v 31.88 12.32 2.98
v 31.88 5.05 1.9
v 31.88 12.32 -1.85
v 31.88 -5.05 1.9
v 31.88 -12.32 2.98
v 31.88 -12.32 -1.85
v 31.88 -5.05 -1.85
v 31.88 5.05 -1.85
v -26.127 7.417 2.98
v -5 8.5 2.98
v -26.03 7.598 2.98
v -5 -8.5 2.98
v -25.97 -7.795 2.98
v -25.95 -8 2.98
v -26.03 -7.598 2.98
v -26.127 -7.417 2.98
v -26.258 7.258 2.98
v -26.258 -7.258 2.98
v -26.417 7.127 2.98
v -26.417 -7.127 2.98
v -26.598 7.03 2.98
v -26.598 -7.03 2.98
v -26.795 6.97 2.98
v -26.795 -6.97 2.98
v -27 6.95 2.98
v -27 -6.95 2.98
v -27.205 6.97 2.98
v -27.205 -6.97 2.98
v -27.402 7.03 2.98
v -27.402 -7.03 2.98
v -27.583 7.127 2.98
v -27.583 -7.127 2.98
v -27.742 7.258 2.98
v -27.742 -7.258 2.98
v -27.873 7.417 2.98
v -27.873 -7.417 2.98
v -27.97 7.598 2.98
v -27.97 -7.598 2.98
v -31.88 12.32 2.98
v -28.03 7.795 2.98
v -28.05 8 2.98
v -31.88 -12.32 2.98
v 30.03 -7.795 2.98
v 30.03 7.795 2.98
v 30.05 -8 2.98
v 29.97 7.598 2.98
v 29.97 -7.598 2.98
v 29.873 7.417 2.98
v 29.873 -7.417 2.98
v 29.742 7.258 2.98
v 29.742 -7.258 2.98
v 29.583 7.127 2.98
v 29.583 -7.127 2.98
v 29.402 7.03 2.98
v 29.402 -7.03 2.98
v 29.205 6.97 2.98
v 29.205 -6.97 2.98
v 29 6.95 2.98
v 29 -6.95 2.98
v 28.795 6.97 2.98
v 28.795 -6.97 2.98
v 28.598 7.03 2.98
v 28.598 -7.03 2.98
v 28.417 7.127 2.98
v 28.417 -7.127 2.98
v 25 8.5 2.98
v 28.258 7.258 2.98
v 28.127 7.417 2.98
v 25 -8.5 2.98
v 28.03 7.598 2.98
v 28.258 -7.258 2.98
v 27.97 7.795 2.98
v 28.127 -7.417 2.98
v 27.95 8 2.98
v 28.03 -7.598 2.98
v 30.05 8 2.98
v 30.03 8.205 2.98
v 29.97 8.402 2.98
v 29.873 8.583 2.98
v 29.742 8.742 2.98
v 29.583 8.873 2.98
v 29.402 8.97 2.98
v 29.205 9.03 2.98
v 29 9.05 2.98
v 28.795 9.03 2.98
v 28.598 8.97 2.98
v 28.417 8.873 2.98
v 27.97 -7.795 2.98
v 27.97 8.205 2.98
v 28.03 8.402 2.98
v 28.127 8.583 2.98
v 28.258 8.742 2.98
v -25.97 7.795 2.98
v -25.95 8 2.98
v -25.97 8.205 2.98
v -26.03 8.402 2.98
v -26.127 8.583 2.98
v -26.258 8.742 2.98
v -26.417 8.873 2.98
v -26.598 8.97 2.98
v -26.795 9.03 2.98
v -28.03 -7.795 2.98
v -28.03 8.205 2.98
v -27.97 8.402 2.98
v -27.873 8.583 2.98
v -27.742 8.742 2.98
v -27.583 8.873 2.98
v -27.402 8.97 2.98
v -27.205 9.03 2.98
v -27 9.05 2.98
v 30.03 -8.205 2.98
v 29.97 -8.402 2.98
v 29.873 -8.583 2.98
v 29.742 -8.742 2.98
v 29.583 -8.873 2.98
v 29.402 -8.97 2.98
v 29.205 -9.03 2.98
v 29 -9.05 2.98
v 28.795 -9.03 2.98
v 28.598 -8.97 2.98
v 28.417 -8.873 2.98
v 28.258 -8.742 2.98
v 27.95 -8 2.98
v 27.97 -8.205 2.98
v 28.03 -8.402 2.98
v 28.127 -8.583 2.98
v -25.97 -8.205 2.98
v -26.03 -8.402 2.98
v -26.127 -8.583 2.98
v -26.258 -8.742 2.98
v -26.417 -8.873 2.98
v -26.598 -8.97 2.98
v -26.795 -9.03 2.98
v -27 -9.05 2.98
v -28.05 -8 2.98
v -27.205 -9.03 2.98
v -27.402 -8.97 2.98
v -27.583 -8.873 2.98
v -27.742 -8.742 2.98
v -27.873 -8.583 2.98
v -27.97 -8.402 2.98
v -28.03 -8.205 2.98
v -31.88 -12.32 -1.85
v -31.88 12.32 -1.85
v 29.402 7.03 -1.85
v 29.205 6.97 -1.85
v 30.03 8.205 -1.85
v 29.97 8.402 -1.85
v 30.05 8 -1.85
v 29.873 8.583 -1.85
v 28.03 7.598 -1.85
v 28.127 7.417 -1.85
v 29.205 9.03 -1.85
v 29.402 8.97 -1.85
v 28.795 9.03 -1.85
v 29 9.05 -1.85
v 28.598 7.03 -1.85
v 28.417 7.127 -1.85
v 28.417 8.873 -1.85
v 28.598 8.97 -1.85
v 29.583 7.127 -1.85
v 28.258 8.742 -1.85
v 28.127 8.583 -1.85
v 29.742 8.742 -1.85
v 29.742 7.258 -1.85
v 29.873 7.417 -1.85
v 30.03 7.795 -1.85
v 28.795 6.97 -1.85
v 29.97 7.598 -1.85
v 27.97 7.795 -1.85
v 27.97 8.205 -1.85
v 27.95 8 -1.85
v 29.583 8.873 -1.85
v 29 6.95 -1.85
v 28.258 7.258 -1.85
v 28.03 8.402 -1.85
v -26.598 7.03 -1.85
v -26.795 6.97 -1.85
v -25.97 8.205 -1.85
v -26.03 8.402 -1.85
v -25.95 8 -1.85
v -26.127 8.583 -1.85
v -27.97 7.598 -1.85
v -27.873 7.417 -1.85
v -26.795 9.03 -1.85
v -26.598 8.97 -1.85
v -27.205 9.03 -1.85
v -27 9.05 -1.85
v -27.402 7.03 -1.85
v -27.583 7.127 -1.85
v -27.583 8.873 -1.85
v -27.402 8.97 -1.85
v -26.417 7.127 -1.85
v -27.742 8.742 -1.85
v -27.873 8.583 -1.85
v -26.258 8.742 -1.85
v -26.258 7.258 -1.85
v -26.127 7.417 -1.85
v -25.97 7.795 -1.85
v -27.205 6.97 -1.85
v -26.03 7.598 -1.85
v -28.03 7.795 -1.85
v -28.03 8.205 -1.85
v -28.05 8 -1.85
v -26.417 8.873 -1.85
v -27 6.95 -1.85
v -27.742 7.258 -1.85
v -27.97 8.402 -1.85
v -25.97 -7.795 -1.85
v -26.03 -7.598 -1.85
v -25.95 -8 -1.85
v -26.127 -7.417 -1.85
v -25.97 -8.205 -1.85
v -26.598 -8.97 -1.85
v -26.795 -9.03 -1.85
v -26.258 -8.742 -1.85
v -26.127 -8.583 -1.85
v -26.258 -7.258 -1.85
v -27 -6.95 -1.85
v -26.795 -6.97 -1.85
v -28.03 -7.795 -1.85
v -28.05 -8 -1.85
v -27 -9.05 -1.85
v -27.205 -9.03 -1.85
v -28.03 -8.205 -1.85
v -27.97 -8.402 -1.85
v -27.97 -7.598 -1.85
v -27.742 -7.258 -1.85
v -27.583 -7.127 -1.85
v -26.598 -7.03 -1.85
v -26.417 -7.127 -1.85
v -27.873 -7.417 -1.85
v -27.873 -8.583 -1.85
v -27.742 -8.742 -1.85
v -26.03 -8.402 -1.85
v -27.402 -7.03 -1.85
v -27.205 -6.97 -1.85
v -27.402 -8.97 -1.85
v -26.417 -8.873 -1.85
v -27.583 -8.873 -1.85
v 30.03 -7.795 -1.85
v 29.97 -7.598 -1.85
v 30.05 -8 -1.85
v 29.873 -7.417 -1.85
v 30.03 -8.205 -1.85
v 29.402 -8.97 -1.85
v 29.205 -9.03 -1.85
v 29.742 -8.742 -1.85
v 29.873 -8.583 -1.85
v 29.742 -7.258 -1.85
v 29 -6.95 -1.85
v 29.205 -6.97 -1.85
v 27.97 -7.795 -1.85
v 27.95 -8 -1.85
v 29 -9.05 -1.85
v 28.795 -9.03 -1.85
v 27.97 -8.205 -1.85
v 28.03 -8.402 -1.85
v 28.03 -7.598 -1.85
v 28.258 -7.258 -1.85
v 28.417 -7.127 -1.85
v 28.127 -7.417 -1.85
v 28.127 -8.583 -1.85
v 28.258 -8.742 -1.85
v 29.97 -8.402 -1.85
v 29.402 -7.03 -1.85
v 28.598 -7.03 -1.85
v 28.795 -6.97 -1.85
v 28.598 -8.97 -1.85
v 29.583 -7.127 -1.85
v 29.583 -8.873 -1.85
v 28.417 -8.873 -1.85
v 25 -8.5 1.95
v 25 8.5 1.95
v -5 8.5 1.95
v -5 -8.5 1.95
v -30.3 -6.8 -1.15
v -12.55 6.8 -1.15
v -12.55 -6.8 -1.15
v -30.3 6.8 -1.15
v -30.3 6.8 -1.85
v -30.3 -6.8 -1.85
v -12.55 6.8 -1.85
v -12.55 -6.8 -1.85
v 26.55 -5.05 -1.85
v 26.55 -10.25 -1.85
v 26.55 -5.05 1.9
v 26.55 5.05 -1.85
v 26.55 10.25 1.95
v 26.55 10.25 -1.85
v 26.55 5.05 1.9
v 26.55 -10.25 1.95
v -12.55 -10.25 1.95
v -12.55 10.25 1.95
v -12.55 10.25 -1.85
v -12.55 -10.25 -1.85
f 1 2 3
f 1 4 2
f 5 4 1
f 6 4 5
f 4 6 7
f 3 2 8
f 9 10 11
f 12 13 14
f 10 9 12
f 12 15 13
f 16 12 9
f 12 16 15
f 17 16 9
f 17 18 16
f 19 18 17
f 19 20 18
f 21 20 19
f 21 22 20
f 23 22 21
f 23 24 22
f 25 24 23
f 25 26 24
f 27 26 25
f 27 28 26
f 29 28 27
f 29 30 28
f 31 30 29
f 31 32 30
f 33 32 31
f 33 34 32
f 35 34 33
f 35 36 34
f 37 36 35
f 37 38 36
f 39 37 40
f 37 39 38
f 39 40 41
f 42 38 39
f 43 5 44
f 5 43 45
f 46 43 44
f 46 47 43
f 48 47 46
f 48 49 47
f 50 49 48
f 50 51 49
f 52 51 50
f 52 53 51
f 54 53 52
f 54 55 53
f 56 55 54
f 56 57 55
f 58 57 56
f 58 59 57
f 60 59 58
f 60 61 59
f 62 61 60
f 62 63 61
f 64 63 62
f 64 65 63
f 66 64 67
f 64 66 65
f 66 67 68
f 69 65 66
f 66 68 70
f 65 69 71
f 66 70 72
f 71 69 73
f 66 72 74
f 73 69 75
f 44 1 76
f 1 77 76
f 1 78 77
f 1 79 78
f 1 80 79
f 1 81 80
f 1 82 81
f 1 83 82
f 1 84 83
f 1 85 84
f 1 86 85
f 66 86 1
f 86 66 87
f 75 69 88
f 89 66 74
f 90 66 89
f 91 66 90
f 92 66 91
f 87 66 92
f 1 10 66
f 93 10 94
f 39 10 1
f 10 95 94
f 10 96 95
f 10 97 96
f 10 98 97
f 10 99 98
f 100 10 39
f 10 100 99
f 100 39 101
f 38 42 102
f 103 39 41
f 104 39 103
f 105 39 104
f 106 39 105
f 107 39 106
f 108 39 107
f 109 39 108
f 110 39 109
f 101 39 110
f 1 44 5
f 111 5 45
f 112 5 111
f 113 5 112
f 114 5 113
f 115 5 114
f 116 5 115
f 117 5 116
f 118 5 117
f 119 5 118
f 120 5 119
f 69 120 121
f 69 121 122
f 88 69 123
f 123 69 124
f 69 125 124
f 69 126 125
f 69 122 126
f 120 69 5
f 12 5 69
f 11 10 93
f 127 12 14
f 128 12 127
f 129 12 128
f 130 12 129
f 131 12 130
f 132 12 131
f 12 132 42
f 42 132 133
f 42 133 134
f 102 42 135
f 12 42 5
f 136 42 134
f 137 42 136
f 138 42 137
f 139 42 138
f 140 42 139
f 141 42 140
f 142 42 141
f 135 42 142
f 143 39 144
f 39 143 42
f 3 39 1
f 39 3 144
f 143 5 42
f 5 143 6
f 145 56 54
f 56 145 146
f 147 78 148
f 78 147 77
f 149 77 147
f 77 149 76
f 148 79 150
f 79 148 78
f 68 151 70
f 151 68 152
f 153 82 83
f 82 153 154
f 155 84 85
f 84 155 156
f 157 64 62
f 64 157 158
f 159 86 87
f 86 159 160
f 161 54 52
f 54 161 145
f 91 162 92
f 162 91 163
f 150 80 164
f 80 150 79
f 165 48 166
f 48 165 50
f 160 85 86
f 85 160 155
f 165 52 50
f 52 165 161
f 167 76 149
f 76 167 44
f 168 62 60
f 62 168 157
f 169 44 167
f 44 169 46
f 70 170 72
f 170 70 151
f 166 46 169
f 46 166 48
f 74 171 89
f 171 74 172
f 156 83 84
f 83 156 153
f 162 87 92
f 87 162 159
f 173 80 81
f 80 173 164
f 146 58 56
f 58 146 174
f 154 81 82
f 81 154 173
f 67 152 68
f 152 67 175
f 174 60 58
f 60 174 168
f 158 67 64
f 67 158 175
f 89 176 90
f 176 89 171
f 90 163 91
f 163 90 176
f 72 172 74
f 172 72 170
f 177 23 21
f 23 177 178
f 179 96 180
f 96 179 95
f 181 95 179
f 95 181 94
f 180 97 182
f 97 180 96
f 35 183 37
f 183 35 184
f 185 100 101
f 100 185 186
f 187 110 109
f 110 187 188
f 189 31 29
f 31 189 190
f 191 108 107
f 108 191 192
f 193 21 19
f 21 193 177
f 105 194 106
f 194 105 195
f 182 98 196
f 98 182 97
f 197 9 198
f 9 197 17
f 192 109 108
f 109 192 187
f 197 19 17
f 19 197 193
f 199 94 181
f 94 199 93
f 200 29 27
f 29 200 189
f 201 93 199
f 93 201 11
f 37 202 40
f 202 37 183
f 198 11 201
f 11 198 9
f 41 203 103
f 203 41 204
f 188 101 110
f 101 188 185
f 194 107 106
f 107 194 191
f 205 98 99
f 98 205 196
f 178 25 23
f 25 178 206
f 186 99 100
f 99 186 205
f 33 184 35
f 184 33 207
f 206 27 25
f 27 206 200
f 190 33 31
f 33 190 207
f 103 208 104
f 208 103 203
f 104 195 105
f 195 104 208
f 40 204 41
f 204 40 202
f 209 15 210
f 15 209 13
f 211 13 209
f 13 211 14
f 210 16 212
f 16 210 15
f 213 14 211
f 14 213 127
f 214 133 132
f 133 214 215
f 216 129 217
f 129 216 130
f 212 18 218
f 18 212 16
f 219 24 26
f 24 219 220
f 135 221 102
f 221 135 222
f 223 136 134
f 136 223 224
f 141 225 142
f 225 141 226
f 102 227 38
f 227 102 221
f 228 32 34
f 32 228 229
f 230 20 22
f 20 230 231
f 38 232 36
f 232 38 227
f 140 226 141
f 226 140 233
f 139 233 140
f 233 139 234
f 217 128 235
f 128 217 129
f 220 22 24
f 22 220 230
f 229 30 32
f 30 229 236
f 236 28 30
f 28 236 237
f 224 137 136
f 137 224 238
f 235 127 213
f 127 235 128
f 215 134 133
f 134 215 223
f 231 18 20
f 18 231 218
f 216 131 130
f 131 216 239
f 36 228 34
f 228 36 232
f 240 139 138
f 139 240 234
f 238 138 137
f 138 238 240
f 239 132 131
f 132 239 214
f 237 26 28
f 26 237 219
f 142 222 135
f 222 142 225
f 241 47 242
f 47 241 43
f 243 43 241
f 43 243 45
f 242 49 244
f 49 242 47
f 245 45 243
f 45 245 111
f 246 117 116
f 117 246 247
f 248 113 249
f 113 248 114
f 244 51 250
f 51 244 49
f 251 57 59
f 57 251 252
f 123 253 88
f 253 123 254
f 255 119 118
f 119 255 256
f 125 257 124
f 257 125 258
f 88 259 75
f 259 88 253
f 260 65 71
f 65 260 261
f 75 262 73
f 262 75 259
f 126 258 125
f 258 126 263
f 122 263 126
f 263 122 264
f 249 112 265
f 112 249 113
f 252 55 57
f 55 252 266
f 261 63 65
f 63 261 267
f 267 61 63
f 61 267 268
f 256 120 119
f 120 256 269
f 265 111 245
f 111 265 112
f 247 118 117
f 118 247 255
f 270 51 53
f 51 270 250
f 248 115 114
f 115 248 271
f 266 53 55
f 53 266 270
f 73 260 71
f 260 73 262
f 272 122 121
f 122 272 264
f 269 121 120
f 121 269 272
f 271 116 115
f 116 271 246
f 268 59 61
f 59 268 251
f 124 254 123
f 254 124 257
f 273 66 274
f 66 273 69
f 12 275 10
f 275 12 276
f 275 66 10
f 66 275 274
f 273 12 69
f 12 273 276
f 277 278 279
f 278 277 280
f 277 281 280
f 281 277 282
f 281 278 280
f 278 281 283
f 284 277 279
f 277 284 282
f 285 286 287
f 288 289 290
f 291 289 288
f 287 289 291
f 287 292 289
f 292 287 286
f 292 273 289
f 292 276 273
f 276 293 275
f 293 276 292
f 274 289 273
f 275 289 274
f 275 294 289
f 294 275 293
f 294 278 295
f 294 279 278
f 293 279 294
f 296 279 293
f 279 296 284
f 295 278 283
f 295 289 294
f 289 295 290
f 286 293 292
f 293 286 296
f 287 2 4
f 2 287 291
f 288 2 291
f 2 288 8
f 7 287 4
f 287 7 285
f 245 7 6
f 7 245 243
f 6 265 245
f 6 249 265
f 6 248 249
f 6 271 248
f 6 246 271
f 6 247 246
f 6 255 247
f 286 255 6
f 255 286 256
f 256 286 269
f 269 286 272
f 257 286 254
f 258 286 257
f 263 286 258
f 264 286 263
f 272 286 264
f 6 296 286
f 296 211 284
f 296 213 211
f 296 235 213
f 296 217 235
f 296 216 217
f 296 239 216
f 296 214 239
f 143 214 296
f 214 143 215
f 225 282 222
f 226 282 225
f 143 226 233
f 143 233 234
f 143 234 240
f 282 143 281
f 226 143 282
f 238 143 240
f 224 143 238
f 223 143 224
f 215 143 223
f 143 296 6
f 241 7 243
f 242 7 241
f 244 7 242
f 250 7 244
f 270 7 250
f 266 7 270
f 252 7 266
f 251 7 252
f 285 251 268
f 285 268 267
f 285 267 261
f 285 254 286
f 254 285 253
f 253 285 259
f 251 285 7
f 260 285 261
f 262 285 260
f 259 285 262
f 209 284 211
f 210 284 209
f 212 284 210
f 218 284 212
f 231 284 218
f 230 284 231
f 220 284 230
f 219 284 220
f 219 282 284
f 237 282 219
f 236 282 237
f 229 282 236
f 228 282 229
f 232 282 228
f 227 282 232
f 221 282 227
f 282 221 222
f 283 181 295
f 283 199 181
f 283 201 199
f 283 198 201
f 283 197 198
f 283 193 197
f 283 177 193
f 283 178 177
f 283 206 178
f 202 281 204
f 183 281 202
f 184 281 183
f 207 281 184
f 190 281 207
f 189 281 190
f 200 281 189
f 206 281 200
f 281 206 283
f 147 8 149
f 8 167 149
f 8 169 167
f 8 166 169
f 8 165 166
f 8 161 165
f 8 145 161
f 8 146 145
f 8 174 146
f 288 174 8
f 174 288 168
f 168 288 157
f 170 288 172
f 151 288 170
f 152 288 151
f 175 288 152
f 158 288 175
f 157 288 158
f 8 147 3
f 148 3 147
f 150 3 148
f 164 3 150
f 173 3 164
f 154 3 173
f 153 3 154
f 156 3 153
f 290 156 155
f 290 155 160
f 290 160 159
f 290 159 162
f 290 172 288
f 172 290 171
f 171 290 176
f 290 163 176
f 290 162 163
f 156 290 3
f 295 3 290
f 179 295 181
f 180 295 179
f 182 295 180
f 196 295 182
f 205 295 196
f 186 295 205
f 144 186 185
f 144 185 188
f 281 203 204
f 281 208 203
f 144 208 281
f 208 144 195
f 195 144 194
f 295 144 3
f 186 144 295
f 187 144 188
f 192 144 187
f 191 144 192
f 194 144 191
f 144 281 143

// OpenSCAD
module housing_shell(tolerance=0.2){    
  toleranceAdjustment = [0.8,0.8,0.8]*tolerance;
  shellSize = [53, 20.4,16.5]*1.2+toleranceAdjustment;
  
  difference(){
    // main shell
    translate([0,0,-7])
    translate(shellSize * -0.5)
    cube(shellSize);
  
    translate([0,0,-shellSize[1]*1.475])
    rotate([0,90,0])
    cylinder(
      h=shellSize[0]+1, 
      r=shellSize[1]*0.9,
      center=true,
      $fn=32
    );
    
    translate([58/2,16/2,-30])
    cylinder(h=60,r=2.1/2, $fn=32);

    translate([-54/2,16/2,-30])
    cylinder(h=60,r=2.1/2, $fn=32);

    translate([-54/2,-16/2,-30])
    cylinder(h=60,r=2.1/2, $fn=32);

    translate([58/2,-16/2,-30])
    cylinder(h=60,r=2.1/2, $fn=32);
  }    
}

module housing_inner(tolerance=0.2){    
  toleranceAdjustment = [0.5,0.5,0.5]*+tolerance;
  
  cellSize = [56.5,13.5,8.4] + toleranceAdjustment;
  boardSize = [39, 20.4,3.8]+ toleranceAdjustment;
  usbPlugSize = [6.7,10,3.7]+ toleranceAdjustment;
  
  frontCutoutSize = [30,17,10];
  
  union() {
    translate([10,0,5])
    translate(frontCutoutSize * -.5)
    cube(frontCutoutSize);
    
    translate([-2,0,-5.4])
    translate(cellSize*-.5)
    cube(cellSize);
    
    translate([7,0,0])
    translate(boardSize*-.5)
    cube(boardSize);
    
    translate([29.5,0,0])
    translate(usbPlugSize*-.5)
    cube(usbPlugSize);
  }
}

module housing() {
  difference() {
    housing_shell();
    housing_inner();
  }
}


module housingHalf1(){
  size2 = [80,60,60];

  difference(){
    housing();
  
    translate([0,0,-31.85])  
    translate(size2*-.5)
    cube(size2);
  }
}

module housingHalf2(){
  size2 = [80,60,60];

  difference(){
    housing();
  
    translate([0,0,60-31.85])  
    translate(size2*-.5)
    cube(size2);
    
    translate([0,-30,-14])
    cube([9,60,3]);
    
    translate([25,-30,-32])
    cube([9,60,20]);
    
    translate([-32,-30,-32])
    cube([9,60,20]);
  }
}


// housing();

housingHalf1();
//housingHalf2();
